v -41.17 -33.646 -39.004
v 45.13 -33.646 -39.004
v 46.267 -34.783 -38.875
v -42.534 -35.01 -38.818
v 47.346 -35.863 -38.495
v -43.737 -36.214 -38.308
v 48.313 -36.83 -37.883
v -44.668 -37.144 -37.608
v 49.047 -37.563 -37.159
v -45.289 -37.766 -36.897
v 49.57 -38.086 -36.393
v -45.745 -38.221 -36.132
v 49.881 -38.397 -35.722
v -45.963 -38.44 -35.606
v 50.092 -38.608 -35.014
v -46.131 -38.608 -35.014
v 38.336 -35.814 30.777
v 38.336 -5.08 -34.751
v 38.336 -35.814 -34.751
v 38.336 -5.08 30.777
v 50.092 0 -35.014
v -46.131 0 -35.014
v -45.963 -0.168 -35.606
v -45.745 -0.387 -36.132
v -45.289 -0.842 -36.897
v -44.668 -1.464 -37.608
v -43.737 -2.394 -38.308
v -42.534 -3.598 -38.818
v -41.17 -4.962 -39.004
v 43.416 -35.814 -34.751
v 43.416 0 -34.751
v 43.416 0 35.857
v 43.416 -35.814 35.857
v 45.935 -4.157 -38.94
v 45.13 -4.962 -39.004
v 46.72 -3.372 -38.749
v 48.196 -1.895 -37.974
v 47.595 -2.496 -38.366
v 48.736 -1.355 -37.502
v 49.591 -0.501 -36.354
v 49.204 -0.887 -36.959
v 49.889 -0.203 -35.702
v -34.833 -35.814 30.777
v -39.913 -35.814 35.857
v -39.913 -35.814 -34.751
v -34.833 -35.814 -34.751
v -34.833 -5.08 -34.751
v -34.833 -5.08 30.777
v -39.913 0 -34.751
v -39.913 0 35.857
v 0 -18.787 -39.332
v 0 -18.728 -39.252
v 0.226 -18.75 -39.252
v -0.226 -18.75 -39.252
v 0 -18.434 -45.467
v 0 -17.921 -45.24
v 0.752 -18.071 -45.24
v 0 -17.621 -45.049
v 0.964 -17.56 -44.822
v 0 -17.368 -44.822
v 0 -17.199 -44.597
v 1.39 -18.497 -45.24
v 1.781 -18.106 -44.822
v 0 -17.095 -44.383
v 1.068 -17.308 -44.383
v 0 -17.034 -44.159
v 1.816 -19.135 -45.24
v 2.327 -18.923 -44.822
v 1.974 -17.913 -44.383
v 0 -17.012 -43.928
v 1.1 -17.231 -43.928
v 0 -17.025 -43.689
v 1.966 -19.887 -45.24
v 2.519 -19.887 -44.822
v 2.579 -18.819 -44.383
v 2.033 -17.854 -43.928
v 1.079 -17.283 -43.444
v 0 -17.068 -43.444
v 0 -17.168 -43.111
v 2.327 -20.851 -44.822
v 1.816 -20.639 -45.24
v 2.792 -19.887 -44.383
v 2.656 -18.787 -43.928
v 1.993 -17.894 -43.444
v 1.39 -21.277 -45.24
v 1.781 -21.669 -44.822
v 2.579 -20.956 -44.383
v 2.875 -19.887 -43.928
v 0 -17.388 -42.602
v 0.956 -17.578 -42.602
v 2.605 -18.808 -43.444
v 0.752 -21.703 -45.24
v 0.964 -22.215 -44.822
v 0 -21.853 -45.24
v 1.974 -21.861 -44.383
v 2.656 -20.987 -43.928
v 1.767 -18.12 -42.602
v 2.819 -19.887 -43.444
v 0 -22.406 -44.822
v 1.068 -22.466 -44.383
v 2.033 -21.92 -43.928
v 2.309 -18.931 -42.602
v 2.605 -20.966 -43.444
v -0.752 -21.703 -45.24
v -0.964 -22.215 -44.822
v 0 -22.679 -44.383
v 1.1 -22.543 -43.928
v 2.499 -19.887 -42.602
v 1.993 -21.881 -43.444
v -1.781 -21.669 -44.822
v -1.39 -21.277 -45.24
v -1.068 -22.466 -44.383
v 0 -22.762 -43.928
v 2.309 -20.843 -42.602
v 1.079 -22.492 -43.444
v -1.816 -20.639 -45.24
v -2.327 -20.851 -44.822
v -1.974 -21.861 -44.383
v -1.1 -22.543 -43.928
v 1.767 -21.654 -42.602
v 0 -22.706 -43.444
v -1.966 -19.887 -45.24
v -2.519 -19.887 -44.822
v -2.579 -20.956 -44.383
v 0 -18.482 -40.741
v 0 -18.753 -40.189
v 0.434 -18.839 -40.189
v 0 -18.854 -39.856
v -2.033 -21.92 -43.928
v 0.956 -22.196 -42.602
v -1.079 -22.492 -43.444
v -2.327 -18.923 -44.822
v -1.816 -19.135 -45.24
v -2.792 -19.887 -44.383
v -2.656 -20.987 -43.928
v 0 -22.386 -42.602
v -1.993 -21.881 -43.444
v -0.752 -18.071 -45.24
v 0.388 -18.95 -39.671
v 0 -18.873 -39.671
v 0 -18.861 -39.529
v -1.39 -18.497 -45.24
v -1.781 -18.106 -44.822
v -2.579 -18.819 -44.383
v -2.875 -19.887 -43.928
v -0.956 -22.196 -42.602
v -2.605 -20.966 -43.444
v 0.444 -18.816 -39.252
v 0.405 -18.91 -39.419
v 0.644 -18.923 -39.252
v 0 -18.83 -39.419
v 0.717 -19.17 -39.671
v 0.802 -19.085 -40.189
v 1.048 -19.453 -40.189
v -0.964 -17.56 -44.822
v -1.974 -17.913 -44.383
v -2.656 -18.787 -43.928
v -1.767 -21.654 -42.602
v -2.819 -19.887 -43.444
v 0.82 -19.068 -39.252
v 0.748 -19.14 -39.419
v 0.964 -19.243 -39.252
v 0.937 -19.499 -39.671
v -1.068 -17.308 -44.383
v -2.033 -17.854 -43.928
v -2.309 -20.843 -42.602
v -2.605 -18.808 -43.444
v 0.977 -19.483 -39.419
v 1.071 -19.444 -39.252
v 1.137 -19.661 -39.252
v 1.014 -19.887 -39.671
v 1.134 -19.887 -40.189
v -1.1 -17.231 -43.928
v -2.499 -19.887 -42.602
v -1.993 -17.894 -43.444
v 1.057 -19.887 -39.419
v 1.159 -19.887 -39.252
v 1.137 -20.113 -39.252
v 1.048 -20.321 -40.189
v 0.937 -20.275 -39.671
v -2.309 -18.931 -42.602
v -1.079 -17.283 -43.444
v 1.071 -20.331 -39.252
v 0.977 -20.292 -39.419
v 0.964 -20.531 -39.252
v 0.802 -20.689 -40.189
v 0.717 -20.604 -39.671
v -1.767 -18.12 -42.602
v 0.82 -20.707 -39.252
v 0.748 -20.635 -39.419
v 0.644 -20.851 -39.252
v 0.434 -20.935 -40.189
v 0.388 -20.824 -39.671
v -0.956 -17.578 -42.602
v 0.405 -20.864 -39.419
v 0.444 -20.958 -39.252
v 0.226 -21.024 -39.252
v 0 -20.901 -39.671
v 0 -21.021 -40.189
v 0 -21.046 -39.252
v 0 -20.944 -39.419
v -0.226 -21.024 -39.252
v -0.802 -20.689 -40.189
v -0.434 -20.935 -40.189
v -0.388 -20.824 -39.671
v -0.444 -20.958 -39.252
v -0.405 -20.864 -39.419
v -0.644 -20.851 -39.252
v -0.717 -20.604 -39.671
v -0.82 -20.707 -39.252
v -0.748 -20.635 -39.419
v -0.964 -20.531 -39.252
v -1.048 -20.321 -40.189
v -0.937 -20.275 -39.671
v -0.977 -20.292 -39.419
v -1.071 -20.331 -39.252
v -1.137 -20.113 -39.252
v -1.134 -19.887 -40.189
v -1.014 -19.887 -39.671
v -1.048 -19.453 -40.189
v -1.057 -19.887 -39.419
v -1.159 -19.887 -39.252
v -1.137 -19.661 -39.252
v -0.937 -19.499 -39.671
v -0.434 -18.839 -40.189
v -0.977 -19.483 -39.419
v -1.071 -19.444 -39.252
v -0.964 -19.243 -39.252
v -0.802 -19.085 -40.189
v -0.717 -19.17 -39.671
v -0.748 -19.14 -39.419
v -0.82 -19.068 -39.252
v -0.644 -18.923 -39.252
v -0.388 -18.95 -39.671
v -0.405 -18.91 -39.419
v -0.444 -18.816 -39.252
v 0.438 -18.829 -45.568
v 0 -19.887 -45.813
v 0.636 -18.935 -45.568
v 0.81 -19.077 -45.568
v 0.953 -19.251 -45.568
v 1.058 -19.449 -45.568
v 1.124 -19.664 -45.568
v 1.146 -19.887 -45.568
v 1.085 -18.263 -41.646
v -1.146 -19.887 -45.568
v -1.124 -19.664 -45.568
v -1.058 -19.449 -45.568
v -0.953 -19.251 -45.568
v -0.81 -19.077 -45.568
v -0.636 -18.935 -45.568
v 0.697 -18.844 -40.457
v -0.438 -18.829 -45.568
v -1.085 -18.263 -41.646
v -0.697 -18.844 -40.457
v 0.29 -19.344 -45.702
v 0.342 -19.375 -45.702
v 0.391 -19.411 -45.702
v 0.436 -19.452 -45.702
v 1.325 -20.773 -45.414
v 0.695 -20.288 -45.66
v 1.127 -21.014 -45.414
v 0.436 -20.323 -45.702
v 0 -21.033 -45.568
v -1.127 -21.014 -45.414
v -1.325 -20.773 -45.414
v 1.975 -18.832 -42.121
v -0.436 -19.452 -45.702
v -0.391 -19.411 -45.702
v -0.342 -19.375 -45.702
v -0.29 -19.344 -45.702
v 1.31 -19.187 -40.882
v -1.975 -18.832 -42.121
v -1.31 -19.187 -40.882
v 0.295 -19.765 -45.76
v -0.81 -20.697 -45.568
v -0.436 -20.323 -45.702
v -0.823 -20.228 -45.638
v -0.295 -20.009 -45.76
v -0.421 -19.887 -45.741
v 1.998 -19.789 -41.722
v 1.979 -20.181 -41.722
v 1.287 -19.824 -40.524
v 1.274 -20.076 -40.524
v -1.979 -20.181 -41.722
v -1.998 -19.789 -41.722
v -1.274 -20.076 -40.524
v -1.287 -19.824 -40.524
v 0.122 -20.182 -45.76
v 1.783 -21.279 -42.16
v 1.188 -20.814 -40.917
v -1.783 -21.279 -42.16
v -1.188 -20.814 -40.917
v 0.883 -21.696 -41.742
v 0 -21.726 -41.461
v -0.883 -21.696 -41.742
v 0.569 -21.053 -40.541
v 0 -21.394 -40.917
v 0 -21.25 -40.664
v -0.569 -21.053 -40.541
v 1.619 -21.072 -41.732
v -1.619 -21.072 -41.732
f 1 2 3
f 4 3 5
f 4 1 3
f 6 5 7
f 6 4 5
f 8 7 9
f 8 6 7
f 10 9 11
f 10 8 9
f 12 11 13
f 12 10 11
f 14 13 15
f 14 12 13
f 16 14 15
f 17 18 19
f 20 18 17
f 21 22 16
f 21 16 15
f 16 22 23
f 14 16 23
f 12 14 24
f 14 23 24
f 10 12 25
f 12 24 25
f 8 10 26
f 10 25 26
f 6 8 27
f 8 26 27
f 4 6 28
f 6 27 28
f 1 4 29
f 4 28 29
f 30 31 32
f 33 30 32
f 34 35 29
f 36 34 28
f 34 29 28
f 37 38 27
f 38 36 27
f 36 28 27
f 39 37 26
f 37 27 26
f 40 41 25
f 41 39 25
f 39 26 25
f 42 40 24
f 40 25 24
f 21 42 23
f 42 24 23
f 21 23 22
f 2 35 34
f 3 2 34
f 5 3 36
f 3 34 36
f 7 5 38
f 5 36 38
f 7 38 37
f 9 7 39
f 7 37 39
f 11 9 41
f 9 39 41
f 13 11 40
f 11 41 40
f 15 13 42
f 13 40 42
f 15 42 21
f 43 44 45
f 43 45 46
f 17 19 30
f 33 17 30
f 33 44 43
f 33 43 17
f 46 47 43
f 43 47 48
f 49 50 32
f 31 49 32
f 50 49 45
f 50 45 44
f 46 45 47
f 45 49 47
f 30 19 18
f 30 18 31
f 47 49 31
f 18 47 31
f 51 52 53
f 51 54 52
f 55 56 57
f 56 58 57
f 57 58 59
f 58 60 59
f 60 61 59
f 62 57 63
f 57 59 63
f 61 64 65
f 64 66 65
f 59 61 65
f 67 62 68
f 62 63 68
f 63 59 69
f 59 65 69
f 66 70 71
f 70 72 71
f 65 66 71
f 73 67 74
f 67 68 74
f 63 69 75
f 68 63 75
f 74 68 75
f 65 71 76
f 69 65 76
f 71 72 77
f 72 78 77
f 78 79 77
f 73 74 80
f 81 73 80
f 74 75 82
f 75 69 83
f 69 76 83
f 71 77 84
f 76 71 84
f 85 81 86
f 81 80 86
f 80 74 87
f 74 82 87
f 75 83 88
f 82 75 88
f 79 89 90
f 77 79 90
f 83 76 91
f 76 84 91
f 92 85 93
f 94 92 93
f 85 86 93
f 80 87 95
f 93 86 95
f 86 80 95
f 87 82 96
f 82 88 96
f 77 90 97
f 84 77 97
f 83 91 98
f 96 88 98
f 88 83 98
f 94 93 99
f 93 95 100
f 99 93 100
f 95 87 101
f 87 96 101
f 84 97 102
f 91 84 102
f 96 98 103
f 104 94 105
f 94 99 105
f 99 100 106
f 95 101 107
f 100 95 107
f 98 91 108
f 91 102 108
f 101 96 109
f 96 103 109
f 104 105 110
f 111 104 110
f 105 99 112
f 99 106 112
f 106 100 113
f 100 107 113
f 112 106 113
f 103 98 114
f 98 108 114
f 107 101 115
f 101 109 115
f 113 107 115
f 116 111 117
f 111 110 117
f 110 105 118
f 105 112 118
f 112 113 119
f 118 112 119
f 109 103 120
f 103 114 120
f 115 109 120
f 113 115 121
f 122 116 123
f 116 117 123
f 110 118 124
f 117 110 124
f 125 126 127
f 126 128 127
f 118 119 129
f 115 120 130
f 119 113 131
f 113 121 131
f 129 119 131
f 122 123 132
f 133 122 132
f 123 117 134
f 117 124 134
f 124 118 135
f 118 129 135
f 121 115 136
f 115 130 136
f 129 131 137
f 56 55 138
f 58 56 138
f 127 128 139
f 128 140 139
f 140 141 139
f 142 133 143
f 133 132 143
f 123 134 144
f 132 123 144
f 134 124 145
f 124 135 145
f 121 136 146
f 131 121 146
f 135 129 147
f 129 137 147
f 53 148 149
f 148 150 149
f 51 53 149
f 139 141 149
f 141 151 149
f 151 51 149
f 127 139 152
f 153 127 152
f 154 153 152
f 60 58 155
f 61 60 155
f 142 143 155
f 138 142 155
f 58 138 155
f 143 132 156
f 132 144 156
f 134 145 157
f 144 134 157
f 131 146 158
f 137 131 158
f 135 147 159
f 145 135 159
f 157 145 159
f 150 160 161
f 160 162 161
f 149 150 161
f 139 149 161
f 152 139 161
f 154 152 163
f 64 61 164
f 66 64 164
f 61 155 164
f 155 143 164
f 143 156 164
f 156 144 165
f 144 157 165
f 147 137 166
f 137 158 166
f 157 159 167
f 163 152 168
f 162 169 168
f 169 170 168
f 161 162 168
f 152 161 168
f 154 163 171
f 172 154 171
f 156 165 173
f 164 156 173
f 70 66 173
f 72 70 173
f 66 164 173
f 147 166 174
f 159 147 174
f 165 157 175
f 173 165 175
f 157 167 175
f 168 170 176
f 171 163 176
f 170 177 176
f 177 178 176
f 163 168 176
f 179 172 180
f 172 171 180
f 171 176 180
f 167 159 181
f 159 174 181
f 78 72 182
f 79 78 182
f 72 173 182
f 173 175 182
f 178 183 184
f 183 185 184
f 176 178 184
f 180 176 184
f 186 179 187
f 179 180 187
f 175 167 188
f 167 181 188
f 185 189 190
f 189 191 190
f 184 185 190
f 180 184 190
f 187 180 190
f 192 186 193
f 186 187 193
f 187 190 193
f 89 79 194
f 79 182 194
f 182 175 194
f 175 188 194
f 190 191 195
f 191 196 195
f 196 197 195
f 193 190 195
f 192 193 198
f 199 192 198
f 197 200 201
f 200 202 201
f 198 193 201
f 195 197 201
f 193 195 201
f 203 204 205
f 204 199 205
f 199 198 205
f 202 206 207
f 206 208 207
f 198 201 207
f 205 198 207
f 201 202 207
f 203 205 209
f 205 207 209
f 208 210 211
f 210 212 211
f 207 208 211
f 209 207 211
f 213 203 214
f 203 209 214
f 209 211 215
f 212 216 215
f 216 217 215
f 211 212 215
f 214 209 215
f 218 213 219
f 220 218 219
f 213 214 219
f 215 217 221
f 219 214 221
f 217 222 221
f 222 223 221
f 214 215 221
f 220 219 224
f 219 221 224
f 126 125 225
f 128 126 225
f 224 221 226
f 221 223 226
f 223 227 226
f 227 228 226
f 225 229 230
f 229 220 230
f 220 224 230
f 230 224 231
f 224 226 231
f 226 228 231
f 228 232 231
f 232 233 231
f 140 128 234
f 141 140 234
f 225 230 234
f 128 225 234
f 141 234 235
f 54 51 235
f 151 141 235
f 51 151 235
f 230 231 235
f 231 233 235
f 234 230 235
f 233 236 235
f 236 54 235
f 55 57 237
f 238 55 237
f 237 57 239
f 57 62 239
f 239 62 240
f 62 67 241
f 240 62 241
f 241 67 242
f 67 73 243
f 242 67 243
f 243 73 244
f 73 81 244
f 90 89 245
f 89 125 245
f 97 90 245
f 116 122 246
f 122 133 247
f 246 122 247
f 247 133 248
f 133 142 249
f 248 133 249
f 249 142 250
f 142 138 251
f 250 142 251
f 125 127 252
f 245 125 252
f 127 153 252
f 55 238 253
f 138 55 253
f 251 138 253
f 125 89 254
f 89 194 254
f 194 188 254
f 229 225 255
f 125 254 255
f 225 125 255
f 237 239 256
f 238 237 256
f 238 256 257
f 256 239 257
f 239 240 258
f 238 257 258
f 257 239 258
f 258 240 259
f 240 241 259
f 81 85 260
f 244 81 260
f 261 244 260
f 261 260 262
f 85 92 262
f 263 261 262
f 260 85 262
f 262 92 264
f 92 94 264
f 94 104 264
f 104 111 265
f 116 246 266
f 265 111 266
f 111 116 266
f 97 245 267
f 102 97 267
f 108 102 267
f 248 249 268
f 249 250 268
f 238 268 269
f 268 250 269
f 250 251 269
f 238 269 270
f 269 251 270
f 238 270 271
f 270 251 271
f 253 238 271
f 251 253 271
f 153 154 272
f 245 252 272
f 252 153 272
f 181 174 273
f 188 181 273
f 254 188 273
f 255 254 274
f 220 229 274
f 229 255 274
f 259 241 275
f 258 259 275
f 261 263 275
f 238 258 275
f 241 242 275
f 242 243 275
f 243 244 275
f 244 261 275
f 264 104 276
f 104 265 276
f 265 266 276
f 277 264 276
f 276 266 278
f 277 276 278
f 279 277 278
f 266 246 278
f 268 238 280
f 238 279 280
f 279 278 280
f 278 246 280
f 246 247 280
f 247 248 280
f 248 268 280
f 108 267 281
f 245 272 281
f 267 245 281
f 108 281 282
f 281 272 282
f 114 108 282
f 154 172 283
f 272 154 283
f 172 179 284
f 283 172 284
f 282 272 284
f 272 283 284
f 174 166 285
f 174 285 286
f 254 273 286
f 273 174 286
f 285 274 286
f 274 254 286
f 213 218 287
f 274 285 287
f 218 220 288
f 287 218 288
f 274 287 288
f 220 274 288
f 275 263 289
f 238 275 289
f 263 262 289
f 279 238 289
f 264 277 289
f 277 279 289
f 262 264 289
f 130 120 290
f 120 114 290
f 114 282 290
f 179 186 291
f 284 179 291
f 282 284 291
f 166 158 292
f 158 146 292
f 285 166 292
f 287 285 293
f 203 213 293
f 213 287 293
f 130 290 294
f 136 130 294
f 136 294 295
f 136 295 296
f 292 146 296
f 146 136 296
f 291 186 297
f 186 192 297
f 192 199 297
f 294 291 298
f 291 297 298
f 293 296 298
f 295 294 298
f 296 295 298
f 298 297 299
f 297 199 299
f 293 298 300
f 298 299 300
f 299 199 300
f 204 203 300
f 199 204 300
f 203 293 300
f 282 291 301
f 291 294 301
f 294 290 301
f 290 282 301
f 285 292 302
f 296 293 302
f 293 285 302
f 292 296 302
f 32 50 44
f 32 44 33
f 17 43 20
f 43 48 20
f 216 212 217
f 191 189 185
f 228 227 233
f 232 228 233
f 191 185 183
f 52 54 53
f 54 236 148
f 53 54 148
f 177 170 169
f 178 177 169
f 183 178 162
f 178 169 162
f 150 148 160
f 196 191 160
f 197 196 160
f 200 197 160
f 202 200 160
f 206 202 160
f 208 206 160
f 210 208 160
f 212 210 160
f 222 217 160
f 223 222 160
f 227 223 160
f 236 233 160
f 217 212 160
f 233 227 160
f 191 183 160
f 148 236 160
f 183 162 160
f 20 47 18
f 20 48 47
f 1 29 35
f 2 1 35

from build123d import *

# Parameters (mm, degrees)
F0_W        = 83.3283886313
F0_H        = 70.6079043448
F1_DEPTH    = 35.814
F2_T        = -5.08
F3_W        = 96.2229035795
F3_H        = 3.9905235171
F4_DEPTH    = 38.608
F5_T1_DEPTH = 121.0318943859
F5_T3_DEPTH = 63.4169908064


# Not quite as in the source:
# - a fillet or chamfer that OpenCascade refuses, or shapes differently, is made with other operations: its cross-section is extruded or revolved along the edge and cut away or added


with BuildPart() as f1:
    # F0 (on Front) → F1 (new body)
    with BuildSketch(Plane.XZ):
        with Locations((1.751370728, 0.5530659109)):
            Rectangle(F0_W, F0_H)
    extrude(amount=F1_DEPTH)

    # F2
    f2_openings = [f1.faces().sort_by_distance(p)[0] for p in [
        (1.751371, -35.814, 0.553066),
        (1.751371, -17.907, -34.750886),
    ]]
    offset(amount=F2_T, openings=f2_openings)


with BuildPart() as f4:
    # F3 (on Front) → F4 (new body)
    with BuildSketch(Plane.XZ):
        with Locations((1.980105415, -37.0091460645)):
            Rectangle(F3_W, F3_H)
    extrude(amount=F4_DEPTH)

    # F5: fillet of radius 5.08 on 4 edges, made by hand

    # F5_s2 → F5_t1 (cut)
    with BuildSketch(Plane.YZ.offset(-58.5358417779)):
        with BuildLine():
            ThreePointArc((-33.6462018387, -39.0044078231), (-36.8298993328, -37.8830023043), (-38.608, -35.013884306))
            Line((-38.608, -35.013884306), (-38.608, -39.0044078231))
            Line((-38.608, -39.0044078231), (-33.6462018387, -39.0044078231))
        make_face()
        with BuildLine():
            ThreePointArc((-4.9617981613, -39.0044078231), (-1.7781006672, -37.8830023043), (0, -35.013884306))
            Line((0, -35.013884306), (0, -39.0044078231))
            Line((0, -39.0044078231), (-4.9617981613, -39.0044078231))
        make_face()
    extrude(amount=F5_T1_DEPTH, mode=Mode.SUBTRACT)

    # F5_s4 → F5_t3 (cut)
    with BuildSketch(Plane.XZ.offset(-12.4044954032)):
        with BuildLine():
            ThreePointArc((45.1297590434, -39.0044078231), (48.3134565375, -37.8830023043), (50.0915572047, -35.013884306))
            Line((50.0915572047, -35.013884306), (50.0915572047, -39.0044078231))
            Line((50.0915572047, -39.0044078231), (45.1297590434, -39.0044078231))
        make_face()
        with BuildLine():
            ThreePointArc((-46.1313463748, -35.013884306), (-44.3532457075, -37.8830023043), (-41.1695482135, -39.0044078231))
            Line((-41.1695482135, -39.0044078231), (-46.1313463748, -39.0044078231))
            Line((-46.1313463748, -39.0044078231), (-46.1313463748, -35.013884306))
        make_face()
    extrude(amount=F5_T3_DEPTH, mode=Mode.SUBTRACT)


with BuildPart() as f7:
    # F6 (on Right) → F7 (revolve)
    with BuildSketch(Plane.YZ):
        with BuildLine():
            Line((-18.7280923128, -39.2518080771), (-19.8871381581, -39.2518080771))
            Line((-19.8871381581, -39.2518080771), (-19.8871381581, -45.8132699132))
            add(Edge.make_bspline(
                [(-19.8871381581, -45.8132699132), (-13.5188465938, -44.8499545455), (-19.8871381581, -40.5852496624), (-18.7280923128, -39.2518080771)],
                knots=[0, 0, 0, 0, 6.663045002, 6.663045002, 6.663045002, 6.663045002], degree=3))
        make_face()
    revolve(axis=Axis((0, -19.8871381581, -42.5325389951), (0, 0, -1)))


solid = Compound([f1.part, f4.part, f7.part])
